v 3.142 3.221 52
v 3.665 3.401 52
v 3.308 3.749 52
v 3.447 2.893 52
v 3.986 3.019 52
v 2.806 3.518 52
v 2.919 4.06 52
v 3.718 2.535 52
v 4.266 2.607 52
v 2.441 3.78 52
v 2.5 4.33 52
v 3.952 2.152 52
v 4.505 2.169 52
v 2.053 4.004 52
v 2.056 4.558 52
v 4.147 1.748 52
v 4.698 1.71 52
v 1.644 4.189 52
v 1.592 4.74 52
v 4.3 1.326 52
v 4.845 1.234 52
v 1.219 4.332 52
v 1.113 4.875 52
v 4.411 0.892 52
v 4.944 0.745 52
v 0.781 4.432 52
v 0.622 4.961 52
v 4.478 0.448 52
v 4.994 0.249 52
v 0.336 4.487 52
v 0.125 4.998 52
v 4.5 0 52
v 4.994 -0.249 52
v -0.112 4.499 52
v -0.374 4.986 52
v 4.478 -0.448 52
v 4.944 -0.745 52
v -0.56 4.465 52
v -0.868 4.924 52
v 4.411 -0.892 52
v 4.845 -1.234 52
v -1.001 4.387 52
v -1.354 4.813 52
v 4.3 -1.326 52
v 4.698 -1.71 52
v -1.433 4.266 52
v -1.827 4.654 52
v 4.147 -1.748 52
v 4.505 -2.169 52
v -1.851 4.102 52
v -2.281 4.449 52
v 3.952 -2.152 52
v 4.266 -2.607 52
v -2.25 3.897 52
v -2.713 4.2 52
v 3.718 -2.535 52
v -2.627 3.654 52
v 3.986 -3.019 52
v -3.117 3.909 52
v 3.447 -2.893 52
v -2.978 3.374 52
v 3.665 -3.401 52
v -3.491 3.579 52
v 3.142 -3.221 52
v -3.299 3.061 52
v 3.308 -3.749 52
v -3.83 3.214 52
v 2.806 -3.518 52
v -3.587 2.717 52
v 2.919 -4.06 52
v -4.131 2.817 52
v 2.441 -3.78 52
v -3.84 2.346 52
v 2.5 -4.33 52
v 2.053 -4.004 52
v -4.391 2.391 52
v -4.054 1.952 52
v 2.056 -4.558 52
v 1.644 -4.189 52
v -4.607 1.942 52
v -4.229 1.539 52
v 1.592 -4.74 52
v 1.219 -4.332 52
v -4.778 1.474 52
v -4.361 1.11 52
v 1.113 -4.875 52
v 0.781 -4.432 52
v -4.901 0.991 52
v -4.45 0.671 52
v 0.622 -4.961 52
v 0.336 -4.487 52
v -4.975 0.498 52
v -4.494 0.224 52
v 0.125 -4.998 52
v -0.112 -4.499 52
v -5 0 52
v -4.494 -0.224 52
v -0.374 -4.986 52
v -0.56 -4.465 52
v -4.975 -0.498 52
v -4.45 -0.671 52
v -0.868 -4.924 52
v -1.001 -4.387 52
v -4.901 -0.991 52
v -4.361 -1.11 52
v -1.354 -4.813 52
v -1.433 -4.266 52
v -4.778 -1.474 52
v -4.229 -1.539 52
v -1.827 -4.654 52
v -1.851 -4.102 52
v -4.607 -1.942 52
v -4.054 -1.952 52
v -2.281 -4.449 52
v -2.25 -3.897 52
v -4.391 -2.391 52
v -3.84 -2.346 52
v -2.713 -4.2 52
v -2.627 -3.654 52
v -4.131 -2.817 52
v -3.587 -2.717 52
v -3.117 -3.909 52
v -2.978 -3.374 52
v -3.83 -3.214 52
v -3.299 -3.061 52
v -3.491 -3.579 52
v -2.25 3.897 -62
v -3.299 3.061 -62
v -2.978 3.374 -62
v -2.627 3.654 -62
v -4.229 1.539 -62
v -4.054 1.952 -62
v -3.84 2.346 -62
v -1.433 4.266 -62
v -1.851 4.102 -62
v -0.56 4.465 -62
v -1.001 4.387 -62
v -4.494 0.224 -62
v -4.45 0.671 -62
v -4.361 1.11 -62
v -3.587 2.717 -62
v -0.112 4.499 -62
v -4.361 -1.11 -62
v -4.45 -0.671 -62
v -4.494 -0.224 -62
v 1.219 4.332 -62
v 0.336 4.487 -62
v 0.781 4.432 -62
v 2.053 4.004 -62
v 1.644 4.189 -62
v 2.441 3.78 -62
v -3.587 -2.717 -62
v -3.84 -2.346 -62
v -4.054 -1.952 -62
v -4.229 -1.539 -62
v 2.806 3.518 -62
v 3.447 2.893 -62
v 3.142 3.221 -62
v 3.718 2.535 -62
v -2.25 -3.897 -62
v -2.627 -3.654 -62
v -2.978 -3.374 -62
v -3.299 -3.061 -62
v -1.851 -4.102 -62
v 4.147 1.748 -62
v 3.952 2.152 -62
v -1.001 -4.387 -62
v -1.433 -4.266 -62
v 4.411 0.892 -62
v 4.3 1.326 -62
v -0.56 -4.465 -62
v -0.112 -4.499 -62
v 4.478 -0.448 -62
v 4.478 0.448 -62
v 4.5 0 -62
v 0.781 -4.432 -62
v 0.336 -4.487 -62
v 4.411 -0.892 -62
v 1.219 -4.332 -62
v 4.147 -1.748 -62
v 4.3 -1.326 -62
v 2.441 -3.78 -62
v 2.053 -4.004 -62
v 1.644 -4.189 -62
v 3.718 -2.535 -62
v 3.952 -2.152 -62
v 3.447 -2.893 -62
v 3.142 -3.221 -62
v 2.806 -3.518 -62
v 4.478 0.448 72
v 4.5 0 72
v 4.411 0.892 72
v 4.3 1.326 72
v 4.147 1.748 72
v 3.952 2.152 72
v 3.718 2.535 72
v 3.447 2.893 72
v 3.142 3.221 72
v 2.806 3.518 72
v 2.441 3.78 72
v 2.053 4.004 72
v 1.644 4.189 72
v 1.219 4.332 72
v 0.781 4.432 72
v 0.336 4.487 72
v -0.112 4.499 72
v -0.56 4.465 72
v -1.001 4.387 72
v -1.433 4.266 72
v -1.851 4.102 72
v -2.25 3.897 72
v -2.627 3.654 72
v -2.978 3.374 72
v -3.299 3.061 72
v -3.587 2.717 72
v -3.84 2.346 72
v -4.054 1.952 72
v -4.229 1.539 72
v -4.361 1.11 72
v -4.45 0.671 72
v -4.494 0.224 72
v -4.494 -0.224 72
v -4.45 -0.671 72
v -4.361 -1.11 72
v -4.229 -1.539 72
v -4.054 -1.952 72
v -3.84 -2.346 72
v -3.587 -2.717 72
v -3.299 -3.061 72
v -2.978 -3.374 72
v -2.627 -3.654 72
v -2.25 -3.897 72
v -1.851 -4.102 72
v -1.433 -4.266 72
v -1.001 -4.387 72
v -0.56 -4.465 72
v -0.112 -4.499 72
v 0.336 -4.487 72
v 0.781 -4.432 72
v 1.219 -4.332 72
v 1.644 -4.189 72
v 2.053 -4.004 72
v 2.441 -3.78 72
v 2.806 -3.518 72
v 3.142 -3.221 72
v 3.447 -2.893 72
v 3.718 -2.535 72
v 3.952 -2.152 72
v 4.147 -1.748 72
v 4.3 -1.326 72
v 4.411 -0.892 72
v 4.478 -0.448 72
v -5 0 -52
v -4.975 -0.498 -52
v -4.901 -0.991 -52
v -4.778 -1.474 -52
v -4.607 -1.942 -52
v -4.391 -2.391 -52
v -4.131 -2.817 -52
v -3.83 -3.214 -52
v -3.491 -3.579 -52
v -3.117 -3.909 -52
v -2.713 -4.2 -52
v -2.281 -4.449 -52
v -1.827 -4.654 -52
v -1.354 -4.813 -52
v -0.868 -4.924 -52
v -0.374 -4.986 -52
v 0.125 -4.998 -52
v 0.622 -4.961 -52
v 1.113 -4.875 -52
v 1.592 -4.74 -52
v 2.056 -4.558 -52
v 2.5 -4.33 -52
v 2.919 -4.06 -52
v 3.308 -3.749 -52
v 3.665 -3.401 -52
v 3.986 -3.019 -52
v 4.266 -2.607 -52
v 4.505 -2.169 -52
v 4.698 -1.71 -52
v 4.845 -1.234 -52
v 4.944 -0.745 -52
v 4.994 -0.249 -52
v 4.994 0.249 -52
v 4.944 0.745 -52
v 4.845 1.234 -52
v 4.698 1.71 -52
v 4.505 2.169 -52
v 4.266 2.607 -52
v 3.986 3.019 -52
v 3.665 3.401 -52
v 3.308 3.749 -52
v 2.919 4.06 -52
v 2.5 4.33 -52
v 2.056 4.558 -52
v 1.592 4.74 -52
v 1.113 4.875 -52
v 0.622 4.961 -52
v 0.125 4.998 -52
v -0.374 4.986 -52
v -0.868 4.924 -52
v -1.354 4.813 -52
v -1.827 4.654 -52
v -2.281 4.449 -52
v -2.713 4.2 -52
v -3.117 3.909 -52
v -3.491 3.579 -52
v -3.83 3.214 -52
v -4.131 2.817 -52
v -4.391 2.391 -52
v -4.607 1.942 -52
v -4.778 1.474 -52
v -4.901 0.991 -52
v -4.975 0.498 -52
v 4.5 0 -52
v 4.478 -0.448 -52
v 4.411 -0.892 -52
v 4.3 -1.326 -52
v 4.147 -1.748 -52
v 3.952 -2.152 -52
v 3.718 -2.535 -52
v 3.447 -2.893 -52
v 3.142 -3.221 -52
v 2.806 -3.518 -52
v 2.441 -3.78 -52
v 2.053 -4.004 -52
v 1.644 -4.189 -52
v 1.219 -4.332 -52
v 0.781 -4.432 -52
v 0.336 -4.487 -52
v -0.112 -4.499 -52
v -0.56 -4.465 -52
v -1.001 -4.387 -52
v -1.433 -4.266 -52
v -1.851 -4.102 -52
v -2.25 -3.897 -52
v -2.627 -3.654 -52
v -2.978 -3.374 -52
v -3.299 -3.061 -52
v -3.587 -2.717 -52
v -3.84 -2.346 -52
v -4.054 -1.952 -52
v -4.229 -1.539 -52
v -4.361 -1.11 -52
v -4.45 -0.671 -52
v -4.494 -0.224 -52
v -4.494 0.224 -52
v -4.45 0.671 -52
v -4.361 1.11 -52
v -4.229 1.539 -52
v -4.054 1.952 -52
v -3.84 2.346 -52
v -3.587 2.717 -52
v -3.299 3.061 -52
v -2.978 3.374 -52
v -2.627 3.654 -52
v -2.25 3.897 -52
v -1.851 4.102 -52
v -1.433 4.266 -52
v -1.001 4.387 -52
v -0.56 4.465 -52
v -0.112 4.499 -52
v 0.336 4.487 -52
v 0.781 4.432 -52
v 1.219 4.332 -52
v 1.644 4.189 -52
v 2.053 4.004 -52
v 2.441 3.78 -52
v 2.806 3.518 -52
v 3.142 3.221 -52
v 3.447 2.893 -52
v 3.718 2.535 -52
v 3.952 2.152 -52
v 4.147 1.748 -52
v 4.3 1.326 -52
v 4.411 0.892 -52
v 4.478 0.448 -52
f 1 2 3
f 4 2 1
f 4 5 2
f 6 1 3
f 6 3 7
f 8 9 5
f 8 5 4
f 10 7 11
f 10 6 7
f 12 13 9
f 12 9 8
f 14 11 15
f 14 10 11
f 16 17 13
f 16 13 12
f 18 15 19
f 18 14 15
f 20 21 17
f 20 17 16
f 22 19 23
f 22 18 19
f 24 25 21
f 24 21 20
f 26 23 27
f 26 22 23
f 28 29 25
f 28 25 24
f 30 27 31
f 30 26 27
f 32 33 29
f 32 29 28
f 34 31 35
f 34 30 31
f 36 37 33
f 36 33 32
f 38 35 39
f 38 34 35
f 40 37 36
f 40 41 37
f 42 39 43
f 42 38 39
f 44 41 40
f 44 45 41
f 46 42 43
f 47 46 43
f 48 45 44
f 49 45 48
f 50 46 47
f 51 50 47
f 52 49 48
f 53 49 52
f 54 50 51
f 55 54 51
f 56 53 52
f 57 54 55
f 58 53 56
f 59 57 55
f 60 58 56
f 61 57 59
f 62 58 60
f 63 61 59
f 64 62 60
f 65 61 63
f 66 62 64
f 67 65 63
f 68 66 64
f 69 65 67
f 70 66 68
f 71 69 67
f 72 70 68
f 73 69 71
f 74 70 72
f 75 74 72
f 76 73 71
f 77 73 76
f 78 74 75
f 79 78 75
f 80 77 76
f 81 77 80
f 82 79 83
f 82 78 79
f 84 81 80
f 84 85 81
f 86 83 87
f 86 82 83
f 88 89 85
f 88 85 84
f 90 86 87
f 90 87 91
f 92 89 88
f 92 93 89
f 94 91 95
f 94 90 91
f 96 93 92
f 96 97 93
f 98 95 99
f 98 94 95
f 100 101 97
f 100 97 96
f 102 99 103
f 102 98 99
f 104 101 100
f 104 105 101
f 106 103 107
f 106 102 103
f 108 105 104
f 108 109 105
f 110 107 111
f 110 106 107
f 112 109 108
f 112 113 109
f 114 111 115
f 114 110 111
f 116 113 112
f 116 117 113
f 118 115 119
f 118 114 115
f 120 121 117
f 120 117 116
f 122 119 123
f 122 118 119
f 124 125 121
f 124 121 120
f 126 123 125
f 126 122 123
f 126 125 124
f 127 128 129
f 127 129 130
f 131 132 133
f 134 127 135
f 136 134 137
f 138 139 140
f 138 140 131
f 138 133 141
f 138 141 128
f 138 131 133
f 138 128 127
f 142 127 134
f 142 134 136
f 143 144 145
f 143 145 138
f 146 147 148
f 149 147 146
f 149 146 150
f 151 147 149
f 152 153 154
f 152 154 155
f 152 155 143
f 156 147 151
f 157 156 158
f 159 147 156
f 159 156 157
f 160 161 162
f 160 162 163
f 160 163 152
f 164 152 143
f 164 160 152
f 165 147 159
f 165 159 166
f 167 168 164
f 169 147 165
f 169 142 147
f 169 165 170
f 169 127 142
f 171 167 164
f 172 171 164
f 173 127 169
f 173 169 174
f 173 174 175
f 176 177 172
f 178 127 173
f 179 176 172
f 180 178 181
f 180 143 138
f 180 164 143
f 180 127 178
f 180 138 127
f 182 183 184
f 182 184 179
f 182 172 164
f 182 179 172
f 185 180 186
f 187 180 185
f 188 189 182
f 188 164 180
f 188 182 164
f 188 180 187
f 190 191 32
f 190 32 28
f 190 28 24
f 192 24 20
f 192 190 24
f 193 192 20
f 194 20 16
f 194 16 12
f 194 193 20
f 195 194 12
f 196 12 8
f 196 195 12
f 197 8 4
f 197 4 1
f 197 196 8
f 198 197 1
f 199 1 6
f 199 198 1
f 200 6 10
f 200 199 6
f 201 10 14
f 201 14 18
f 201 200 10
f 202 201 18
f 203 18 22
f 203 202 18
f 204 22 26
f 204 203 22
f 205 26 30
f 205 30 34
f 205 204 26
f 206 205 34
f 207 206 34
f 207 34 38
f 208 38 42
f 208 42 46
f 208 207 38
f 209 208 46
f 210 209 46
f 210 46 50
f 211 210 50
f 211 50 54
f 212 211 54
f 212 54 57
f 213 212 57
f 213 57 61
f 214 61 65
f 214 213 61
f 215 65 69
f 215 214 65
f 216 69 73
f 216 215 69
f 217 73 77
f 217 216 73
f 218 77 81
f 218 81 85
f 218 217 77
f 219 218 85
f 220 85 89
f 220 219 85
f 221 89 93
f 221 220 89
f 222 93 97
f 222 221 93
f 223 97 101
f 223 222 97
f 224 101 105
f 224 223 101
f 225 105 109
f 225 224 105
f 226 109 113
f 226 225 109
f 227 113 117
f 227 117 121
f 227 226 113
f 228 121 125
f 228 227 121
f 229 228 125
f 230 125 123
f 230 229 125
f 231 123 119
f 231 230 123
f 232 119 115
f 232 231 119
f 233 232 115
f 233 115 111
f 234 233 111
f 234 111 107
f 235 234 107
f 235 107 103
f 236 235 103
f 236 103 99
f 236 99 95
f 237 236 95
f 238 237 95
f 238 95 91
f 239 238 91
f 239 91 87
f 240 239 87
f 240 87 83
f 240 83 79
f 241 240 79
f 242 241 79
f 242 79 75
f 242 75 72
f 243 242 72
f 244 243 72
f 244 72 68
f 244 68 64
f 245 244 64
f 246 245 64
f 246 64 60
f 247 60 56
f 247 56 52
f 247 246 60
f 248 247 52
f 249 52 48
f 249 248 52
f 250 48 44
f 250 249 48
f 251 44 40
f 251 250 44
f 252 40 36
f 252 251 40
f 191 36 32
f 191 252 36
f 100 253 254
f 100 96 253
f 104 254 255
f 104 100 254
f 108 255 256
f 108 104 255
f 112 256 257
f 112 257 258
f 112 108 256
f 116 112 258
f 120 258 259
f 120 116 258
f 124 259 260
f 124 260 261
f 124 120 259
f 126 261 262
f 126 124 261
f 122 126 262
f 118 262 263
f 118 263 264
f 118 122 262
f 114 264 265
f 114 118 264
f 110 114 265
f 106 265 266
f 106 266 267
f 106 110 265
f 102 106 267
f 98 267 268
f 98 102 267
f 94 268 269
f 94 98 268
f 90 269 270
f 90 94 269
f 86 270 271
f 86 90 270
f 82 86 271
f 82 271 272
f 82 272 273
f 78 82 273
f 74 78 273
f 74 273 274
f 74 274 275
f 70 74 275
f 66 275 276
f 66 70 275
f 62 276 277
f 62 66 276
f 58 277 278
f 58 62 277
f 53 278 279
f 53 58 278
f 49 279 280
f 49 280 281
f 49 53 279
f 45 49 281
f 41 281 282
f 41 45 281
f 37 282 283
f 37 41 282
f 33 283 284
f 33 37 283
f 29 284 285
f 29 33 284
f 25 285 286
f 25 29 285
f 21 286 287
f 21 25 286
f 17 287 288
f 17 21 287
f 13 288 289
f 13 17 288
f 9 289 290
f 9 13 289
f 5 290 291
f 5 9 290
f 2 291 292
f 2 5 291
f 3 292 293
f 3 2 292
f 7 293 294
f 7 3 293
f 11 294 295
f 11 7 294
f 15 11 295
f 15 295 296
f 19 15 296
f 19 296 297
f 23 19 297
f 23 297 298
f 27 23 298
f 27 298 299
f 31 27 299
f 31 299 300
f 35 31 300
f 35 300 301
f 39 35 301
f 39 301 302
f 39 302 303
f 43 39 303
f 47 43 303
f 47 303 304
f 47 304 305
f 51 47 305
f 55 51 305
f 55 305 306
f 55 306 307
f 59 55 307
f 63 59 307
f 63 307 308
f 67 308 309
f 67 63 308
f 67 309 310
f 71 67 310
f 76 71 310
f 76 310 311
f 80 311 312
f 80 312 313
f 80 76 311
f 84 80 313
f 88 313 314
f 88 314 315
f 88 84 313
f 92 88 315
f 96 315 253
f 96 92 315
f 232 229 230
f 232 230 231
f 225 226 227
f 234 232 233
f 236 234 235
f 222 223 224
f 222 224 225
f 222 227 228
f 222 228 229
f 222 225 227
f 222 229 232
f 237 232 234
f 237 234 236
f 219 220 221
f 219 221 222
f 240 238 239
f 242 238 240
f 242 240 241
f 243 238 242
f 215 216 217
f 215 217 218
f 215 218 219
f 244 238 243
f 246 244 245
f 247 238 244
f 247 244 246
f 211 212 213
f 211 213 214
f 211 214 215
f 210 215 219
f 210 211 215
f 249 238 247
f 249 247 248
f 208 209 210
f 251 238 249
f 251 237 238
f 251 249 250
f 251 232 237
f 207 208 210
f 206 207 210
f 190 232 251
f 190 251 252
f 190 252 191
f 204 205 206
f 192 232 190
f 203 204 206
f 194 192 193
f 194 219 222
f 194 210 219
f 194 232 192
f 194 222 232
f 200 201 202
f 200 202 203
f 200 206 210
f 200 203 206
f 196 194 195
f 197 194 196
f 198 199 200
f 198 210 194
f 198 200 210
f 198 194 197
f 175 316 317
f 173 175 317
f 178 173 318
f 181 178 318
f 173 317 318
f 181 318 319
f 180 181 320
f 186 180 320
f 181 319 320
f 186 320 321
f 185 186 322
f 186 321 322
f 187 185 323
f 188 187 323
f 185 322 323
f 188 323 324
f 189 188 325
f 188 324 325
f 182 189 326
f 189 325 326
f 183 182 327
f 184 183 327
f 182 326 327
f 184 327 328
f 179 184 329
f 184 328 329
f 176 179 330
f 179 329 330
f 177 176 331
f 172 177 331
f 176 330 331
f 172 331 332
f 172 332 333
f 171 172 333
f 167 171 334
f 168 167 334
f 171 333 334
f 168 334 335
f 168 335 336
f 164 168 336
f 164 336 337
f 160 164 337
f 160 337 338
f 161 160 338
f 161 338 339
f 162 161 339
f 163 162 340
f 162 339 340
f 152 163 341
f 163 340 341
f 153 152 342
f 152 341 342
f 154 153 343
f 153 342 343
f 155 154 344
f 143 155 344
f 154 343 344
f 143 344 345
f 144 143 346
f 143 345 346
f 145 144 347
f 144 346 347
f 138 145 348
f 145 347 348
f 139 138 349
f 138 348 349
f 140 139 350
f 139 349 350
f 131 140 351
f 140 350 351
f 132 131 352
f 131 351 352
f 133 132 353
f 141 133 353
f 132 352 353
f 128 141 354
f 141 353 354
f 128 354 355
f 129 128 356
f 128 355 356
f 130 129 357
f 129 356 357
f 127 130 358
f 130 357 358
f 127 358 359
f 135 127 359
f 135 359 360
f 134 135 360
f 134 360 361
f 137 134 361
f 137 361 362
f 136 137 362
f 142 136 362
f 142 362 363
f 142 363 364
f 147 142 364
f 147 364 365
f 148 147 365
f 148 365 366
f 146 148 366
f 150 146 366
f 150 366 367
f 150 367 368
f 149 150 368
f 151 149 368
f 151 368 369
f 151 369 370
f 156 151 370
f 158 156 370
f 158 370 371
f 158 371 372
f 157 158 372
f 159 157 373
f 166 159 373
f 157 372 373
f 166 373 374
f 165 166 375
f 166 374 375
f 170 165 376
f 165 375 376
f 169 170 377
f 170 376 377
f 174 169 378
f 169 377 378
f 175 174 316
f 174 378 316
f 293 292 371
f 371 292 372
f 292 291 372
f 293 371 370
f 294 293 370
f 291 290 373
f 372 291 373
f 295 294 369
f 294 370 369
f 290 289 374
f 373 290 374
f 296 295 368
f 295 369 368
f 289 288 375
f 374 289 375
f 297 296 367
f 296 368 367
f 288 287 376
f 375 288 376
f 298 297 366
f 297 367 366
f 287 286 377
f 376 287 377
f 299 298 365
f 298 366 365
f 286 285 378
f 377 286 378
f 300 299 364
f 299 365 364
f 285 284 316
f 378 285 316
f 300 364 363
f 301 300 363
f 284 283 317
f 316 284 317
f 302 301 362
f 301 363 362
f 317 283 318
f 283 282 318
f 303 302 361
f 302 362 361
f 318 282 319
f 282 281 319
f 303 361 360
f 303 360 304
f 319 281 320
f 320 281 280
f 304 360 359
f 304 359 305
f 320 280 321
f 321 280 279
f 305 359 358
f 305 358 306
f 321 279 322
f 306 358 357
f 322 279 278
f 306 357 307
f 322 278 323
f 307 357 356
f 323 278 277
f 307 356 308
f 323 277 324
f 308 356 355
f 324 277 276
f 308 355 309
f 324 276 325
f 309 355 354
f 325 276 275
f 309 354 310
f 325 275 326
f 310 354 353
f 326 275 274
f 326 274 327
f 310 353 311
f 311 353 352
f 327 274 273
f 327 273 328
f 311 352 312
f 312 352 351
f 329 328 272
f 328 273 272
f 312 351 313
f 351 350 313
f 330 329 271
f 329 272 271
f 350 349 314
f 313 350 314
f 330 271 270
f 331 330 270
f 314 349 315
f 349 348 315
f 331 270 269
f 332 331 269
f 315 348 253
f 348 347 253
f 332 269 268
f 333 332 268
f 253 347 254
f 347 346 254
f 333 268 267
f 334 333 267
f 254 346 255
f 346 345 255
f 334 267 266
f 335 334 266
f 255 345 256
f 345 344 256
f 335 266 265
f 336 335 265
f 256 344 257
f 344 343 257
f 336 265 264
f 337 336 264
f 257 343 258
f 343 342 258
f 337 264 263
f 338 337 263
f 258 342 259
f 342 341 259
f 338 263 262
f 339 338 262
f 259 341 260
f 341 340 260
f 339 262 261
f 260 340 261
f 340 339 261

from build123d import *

# Parameters (mm, degrees)
SKETCH_1_R      = 5
EXTRUDE_1_DEPTH = 52
SKETCH_2_R      = 4.5
EXTRUDE_2_DEPTH = 10
EXTRUDE_START   = 20
SKETCH_3_R      = 4.5
EXTRUDE_3_DEPTH = 20


with BuildPart() as part:
    # 草图1 → 凸台-拉伸1 (new, symmetric)
    with BuildSketch(Plane.XY):
        with Locations(Location((0, 0, 0), (0, 0, 180))):
            Circle(SKETCH_1_R)
    extrude(amount=EXTRUDE_1_DEPTH, both=True)

    # 草图2 → 凸台-拉伸2 (add)
    with BuildSketch(Plane(origin=(0, 0, -52), x_dir=(-1, 0, 0), z_dir=(0, 0, -1))):
        with Locations(Location((0, 0, 0), (0, 0, 180))):
            Circle(SKETCH_2_R)
    extrude(amount=EXTRUDE_2_DEPTH)

    # 草图3 → 凸台-拉伸3 (add)
    with BuildSketch(Plane.XY.offset(52).offset(EXTRUDE_START)):
        Circle(SKETCH_3_R)
    extrude(amount=-EXTRUDE_3_DEPTH)


solid = part.part
